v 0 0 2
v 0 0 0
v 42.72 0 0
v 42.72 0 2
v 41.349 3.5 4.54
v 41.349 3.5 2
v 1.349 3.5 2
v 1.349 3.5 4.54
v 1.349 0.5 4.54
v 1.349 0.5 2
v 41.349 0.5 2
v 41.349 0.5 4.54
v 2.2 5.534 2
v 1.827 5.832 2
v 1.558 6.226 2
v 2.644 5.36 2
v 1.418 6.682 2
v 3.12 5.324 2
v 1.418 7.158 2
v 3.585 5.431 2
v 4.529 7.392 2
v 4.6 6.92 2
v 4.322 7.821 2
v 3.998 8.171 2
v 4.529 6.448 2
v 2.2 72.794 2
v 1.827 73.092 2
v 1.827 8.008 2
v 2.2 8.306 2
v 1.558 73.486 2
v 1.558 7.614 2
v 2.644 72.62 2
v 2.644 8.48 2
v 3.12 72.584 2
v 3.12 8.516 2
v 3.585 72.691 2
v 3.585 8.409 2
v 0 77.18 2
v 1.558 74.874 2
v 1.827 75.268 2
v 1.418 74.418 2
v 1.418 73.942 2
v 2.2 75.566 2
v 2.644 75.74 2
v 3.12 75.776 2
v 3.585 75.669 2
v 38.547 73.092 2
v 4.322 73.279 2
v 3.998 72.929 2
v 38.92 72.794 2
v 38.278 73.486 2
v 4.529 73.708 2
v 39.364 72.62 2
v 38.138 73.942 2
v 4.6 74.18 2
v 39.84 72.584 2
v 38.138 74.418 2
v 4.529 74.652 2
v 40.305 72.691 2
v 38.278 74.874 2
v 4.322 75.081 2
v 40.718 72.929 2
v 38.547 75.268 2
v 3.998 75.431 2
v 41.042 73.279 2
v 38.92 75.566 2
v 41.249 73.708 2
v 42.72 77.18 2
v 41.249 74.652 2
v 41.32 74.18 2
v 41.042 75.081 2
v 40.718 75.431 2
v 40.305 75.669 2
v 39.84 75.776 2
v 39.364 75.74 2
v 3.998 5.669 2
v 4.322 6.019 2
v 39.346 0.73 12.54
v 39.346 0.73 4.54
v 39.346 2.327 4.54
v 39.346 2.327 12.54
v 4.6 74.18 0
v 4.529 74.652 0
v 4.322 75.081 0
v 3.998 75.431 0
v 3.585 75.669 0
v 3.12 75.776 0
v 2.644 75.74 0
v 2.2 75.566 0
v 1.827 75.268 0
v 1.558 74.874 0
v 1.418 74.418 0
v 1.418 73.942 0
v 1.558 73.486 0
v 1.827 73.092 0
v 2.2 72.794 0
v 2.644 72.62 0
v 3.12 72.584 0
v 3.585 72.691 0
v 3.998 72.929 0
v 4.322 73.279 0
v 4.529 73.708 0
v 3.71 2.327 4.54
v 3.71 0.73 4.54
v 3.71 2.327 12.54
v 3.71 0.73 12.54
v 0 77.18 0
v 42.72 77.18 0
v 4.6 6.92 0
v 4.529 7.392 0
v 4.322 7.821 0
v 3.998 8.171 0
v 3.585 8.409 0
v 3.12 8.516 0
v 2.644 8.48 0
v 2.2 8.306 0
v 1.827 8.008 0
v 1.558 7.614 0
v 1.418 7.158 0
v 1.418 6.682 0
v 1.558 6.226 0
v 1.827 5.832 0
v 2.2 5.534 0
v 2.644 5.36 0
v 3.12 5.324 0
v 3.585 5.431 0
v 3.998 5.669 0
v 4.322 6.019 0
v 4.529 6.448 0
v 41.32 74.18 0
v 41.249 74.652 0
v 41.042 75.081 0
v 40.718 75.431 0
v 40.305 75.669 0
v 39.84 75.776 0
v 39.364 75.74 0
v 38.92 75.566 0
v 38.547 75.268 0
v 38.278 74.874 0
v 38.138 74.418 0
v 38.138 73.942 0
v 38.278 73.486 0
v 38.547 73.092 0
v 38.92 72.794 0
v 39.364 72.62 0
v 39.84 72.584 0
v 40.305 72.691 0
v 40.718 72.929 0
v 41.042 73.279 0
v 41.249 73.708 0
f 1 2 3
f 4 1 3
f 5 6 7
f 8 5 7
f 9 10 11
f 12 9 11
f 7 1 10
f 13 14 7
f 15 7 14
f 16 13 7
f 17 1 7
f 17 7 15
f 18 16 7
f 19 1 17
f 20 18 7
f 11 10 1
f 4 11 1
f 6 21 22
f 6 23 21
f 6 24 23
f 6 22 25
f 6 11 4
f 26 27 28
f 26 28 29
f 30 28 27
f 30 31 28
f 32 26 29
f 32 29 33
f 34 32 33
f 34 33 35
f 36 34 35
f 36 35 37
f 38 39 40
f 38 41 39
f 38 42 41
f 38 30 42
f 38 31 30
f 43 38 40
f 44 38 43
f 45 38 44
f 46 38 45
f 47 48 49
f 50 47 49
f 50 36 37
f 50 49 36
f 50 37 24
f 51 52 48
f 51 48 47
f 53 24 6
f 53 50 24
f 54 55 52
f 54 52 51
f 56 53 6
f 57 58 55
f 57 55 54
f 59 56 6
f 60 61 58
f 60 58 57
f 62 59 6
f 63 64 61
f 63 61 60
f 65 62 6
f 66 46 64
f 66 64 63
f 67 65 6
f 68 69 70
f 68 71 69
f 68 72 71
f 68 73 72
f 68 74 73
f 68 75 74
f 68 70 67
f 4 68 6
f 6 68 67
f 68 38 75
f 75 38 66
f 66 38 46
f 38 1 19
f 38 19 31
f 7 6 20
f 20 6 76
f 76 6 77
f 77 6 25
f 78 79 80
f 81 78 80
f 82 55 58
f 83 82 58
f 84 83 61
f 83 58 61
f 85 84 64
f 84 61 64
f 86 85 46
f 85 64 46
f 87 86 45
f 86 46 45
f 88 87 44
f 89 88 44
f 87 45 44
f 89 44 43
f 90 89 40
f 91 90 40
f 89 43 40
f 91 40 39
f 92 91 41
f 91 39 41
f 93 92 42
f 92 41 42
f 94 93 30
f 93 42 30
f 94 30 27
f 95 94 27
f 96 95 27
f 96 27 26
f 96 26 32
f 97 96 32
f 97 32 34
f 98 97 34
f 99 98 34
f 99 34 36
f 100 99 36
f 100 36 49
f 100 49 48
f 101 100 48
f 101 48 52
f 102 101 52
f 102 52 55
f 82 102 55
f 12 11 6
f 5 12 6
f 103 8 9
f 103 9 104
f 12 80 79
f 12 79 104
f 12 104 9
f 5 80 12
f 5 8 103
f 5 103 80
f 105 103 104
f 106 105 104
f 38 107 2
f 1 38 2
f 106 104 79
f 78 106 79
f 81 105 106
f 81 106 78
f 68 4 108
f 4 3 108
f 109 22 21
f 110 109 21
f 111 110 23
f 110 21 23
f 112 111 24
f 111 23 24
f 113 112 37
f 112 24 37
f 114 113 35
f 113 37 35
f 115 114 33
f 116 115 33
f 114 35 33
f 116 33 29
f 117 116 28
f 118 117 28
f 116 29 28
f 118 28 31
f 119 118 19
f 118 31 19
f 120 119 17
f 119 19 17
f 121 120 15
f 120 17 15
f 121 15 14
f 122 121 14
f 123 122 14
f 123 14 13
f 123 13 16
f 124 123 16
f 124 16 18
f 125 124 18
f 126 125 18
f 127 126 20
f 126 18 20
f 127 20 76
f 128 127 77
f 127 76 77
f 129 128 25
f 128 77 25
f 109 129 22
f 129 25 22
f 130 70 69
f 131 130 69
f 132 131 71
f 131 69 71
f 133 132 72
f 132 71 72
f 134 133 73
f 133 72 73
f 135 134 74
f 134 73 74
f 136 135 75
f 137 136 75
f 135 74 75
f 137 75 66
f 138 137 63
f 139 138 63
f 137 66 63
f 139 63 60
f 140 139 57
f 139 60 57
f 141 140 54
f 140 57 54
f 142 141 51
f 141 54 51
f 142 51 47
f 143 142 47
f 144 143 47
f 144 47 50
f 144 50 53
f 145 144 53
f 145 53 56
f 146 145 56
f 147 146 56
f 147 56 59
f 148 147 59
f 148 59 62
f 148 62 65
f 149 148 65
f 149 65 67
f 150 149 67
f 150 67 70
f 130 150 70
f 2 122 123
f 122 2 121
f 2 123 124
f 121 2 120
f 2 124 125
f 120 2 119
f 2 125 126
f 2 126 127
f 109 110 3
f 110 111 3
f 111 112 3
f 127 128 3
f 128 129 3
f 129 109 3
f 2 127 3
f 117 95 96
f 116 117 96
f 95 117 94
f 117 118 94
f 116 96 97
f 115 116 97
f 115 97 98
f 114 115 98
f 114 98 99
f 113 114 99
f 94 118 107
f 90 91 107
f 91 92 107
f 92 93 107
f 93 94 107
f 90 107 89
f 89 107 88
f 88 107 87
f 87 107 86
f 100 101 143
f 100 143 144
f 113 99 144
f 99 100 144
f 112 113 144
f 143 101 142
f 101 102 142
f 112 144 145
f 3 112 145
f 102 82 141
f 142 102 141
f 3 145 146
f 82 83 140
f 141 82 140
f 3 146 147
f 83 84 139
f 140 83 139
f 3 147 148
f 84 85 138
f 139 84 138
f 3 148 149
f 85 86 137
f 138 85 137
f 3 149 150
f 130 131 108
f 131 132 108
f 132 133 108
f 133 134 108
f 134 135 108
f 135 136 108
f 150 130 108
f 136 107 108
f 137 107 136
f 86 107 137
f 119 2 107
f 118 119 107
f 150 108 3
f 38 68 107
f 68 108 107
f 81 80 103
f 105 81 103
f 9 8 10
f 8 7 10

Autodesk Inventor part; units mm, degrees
ref_plane "YZ Plane" through (0, 0, 0) normal (1, 0, 0) x (0, 1, 0)
ref_plane "XZ Plane" through (0, 0, 0) normal (0, 1, 0) x (-1, 0, 0)
ref_plane "XY Plane" through (0, 0, 0) normal (0, 0, 1) x (1, 0, 0)
sketch "Sketch1" plane through (0, 0, 0) normal (0, 0, 1) x (1, 0, 0)
  line L0 (42.72, 0) -> (42.72, 77.18)
  line L1 (42.72, 77.18) -> (0, 77.18)
  line L2 (0, 77.18) -> (0, 0)
  line L3 (0, 0) -> (42.72, 0)
  point P0 (0, 0)
  dimension "d0" = 77.18
  dimension "d1" = 42.72
extrude "Extrusion1" add sketch "Sketch1" along normal blind 2
sketch "Sketch3" plane through (0, 0, 2) normal (0, 0, 1) x (1, 0, 0)
  line L0 (1.3486, 0.5) -> (41.3486, 0.5)
  line L1 (41.3486, 0.5) -> (41.3486, 3.5)
  line L2 (41.3486, 3.5) -> (1.3486, 3.5)
  line L3 (1.3486, 3.5) -> (1.3486, 0.5)
  line L4 (0, 0) -> (42.72, 0) projected
  dimension "d4" = 40
  dimension "d5" = 3
  dimension "d18" = 0.5
sketch "Sketch4" plane through (0, 0, 2) normal (0, 0, 1) x (1, 0, 0)
  point P0 (0, 0)
sketch "Sketch5" plane through (0, 0, 2) normal (0, 0, 1) x (1, 0, 0)
  point P0 (0, 0)
extrude "Extrusion2" add sketch "Sketch3" along normal blind 2.54
sketch "Sketch6" plane through (-2.2901, 18.5965, 2) normal (0, 0, 1) x (1, 0, 0)
  line L0 (41.636, -17.8665) -> (41.636, -16.2696)
  line L1 (41.636, -16.2696) -> (6, -16.2696)
  line L2 (6, -16.2696) -> (6, -17.8665)
  line L3 (6, -17.8665) -> (41.636, -17.8665)
  line L4 (43.6387, -18.0965) -> (3.6387, -18.0965) projected
  point P0 (0, 0)
  dimension "d19" = 0.23
extrude "Extrusion3" add sketch "Sketch6" along normal blind 10.54
sketch "Sketch7" plane through (0, 0, 2) normal (0, 0, 1) x (1, 0, 0)
  circle A0 centre (3, 6.92) radius 1.6
  point P0 (0, 0)
  dimension "d11" = 3.2
extrude "Extrusion4" cut sketch "Sketch7" against normal blind 2.54
sketch "Sketch8" plane through (0, 0, 2) normal (0, 0, 1) x (1, 0, 0)
  circle A0 centre (3, 74.18) radius 1.6
  circle A1 centre (39.72, 74.18) radius 1.6
  point P0 (0, 0)
  dimension "d14" = 3.2
extrude "Extrusion5" cut sketch "Sketch8" against normal blind 2.54
properties part number "lcd display"
